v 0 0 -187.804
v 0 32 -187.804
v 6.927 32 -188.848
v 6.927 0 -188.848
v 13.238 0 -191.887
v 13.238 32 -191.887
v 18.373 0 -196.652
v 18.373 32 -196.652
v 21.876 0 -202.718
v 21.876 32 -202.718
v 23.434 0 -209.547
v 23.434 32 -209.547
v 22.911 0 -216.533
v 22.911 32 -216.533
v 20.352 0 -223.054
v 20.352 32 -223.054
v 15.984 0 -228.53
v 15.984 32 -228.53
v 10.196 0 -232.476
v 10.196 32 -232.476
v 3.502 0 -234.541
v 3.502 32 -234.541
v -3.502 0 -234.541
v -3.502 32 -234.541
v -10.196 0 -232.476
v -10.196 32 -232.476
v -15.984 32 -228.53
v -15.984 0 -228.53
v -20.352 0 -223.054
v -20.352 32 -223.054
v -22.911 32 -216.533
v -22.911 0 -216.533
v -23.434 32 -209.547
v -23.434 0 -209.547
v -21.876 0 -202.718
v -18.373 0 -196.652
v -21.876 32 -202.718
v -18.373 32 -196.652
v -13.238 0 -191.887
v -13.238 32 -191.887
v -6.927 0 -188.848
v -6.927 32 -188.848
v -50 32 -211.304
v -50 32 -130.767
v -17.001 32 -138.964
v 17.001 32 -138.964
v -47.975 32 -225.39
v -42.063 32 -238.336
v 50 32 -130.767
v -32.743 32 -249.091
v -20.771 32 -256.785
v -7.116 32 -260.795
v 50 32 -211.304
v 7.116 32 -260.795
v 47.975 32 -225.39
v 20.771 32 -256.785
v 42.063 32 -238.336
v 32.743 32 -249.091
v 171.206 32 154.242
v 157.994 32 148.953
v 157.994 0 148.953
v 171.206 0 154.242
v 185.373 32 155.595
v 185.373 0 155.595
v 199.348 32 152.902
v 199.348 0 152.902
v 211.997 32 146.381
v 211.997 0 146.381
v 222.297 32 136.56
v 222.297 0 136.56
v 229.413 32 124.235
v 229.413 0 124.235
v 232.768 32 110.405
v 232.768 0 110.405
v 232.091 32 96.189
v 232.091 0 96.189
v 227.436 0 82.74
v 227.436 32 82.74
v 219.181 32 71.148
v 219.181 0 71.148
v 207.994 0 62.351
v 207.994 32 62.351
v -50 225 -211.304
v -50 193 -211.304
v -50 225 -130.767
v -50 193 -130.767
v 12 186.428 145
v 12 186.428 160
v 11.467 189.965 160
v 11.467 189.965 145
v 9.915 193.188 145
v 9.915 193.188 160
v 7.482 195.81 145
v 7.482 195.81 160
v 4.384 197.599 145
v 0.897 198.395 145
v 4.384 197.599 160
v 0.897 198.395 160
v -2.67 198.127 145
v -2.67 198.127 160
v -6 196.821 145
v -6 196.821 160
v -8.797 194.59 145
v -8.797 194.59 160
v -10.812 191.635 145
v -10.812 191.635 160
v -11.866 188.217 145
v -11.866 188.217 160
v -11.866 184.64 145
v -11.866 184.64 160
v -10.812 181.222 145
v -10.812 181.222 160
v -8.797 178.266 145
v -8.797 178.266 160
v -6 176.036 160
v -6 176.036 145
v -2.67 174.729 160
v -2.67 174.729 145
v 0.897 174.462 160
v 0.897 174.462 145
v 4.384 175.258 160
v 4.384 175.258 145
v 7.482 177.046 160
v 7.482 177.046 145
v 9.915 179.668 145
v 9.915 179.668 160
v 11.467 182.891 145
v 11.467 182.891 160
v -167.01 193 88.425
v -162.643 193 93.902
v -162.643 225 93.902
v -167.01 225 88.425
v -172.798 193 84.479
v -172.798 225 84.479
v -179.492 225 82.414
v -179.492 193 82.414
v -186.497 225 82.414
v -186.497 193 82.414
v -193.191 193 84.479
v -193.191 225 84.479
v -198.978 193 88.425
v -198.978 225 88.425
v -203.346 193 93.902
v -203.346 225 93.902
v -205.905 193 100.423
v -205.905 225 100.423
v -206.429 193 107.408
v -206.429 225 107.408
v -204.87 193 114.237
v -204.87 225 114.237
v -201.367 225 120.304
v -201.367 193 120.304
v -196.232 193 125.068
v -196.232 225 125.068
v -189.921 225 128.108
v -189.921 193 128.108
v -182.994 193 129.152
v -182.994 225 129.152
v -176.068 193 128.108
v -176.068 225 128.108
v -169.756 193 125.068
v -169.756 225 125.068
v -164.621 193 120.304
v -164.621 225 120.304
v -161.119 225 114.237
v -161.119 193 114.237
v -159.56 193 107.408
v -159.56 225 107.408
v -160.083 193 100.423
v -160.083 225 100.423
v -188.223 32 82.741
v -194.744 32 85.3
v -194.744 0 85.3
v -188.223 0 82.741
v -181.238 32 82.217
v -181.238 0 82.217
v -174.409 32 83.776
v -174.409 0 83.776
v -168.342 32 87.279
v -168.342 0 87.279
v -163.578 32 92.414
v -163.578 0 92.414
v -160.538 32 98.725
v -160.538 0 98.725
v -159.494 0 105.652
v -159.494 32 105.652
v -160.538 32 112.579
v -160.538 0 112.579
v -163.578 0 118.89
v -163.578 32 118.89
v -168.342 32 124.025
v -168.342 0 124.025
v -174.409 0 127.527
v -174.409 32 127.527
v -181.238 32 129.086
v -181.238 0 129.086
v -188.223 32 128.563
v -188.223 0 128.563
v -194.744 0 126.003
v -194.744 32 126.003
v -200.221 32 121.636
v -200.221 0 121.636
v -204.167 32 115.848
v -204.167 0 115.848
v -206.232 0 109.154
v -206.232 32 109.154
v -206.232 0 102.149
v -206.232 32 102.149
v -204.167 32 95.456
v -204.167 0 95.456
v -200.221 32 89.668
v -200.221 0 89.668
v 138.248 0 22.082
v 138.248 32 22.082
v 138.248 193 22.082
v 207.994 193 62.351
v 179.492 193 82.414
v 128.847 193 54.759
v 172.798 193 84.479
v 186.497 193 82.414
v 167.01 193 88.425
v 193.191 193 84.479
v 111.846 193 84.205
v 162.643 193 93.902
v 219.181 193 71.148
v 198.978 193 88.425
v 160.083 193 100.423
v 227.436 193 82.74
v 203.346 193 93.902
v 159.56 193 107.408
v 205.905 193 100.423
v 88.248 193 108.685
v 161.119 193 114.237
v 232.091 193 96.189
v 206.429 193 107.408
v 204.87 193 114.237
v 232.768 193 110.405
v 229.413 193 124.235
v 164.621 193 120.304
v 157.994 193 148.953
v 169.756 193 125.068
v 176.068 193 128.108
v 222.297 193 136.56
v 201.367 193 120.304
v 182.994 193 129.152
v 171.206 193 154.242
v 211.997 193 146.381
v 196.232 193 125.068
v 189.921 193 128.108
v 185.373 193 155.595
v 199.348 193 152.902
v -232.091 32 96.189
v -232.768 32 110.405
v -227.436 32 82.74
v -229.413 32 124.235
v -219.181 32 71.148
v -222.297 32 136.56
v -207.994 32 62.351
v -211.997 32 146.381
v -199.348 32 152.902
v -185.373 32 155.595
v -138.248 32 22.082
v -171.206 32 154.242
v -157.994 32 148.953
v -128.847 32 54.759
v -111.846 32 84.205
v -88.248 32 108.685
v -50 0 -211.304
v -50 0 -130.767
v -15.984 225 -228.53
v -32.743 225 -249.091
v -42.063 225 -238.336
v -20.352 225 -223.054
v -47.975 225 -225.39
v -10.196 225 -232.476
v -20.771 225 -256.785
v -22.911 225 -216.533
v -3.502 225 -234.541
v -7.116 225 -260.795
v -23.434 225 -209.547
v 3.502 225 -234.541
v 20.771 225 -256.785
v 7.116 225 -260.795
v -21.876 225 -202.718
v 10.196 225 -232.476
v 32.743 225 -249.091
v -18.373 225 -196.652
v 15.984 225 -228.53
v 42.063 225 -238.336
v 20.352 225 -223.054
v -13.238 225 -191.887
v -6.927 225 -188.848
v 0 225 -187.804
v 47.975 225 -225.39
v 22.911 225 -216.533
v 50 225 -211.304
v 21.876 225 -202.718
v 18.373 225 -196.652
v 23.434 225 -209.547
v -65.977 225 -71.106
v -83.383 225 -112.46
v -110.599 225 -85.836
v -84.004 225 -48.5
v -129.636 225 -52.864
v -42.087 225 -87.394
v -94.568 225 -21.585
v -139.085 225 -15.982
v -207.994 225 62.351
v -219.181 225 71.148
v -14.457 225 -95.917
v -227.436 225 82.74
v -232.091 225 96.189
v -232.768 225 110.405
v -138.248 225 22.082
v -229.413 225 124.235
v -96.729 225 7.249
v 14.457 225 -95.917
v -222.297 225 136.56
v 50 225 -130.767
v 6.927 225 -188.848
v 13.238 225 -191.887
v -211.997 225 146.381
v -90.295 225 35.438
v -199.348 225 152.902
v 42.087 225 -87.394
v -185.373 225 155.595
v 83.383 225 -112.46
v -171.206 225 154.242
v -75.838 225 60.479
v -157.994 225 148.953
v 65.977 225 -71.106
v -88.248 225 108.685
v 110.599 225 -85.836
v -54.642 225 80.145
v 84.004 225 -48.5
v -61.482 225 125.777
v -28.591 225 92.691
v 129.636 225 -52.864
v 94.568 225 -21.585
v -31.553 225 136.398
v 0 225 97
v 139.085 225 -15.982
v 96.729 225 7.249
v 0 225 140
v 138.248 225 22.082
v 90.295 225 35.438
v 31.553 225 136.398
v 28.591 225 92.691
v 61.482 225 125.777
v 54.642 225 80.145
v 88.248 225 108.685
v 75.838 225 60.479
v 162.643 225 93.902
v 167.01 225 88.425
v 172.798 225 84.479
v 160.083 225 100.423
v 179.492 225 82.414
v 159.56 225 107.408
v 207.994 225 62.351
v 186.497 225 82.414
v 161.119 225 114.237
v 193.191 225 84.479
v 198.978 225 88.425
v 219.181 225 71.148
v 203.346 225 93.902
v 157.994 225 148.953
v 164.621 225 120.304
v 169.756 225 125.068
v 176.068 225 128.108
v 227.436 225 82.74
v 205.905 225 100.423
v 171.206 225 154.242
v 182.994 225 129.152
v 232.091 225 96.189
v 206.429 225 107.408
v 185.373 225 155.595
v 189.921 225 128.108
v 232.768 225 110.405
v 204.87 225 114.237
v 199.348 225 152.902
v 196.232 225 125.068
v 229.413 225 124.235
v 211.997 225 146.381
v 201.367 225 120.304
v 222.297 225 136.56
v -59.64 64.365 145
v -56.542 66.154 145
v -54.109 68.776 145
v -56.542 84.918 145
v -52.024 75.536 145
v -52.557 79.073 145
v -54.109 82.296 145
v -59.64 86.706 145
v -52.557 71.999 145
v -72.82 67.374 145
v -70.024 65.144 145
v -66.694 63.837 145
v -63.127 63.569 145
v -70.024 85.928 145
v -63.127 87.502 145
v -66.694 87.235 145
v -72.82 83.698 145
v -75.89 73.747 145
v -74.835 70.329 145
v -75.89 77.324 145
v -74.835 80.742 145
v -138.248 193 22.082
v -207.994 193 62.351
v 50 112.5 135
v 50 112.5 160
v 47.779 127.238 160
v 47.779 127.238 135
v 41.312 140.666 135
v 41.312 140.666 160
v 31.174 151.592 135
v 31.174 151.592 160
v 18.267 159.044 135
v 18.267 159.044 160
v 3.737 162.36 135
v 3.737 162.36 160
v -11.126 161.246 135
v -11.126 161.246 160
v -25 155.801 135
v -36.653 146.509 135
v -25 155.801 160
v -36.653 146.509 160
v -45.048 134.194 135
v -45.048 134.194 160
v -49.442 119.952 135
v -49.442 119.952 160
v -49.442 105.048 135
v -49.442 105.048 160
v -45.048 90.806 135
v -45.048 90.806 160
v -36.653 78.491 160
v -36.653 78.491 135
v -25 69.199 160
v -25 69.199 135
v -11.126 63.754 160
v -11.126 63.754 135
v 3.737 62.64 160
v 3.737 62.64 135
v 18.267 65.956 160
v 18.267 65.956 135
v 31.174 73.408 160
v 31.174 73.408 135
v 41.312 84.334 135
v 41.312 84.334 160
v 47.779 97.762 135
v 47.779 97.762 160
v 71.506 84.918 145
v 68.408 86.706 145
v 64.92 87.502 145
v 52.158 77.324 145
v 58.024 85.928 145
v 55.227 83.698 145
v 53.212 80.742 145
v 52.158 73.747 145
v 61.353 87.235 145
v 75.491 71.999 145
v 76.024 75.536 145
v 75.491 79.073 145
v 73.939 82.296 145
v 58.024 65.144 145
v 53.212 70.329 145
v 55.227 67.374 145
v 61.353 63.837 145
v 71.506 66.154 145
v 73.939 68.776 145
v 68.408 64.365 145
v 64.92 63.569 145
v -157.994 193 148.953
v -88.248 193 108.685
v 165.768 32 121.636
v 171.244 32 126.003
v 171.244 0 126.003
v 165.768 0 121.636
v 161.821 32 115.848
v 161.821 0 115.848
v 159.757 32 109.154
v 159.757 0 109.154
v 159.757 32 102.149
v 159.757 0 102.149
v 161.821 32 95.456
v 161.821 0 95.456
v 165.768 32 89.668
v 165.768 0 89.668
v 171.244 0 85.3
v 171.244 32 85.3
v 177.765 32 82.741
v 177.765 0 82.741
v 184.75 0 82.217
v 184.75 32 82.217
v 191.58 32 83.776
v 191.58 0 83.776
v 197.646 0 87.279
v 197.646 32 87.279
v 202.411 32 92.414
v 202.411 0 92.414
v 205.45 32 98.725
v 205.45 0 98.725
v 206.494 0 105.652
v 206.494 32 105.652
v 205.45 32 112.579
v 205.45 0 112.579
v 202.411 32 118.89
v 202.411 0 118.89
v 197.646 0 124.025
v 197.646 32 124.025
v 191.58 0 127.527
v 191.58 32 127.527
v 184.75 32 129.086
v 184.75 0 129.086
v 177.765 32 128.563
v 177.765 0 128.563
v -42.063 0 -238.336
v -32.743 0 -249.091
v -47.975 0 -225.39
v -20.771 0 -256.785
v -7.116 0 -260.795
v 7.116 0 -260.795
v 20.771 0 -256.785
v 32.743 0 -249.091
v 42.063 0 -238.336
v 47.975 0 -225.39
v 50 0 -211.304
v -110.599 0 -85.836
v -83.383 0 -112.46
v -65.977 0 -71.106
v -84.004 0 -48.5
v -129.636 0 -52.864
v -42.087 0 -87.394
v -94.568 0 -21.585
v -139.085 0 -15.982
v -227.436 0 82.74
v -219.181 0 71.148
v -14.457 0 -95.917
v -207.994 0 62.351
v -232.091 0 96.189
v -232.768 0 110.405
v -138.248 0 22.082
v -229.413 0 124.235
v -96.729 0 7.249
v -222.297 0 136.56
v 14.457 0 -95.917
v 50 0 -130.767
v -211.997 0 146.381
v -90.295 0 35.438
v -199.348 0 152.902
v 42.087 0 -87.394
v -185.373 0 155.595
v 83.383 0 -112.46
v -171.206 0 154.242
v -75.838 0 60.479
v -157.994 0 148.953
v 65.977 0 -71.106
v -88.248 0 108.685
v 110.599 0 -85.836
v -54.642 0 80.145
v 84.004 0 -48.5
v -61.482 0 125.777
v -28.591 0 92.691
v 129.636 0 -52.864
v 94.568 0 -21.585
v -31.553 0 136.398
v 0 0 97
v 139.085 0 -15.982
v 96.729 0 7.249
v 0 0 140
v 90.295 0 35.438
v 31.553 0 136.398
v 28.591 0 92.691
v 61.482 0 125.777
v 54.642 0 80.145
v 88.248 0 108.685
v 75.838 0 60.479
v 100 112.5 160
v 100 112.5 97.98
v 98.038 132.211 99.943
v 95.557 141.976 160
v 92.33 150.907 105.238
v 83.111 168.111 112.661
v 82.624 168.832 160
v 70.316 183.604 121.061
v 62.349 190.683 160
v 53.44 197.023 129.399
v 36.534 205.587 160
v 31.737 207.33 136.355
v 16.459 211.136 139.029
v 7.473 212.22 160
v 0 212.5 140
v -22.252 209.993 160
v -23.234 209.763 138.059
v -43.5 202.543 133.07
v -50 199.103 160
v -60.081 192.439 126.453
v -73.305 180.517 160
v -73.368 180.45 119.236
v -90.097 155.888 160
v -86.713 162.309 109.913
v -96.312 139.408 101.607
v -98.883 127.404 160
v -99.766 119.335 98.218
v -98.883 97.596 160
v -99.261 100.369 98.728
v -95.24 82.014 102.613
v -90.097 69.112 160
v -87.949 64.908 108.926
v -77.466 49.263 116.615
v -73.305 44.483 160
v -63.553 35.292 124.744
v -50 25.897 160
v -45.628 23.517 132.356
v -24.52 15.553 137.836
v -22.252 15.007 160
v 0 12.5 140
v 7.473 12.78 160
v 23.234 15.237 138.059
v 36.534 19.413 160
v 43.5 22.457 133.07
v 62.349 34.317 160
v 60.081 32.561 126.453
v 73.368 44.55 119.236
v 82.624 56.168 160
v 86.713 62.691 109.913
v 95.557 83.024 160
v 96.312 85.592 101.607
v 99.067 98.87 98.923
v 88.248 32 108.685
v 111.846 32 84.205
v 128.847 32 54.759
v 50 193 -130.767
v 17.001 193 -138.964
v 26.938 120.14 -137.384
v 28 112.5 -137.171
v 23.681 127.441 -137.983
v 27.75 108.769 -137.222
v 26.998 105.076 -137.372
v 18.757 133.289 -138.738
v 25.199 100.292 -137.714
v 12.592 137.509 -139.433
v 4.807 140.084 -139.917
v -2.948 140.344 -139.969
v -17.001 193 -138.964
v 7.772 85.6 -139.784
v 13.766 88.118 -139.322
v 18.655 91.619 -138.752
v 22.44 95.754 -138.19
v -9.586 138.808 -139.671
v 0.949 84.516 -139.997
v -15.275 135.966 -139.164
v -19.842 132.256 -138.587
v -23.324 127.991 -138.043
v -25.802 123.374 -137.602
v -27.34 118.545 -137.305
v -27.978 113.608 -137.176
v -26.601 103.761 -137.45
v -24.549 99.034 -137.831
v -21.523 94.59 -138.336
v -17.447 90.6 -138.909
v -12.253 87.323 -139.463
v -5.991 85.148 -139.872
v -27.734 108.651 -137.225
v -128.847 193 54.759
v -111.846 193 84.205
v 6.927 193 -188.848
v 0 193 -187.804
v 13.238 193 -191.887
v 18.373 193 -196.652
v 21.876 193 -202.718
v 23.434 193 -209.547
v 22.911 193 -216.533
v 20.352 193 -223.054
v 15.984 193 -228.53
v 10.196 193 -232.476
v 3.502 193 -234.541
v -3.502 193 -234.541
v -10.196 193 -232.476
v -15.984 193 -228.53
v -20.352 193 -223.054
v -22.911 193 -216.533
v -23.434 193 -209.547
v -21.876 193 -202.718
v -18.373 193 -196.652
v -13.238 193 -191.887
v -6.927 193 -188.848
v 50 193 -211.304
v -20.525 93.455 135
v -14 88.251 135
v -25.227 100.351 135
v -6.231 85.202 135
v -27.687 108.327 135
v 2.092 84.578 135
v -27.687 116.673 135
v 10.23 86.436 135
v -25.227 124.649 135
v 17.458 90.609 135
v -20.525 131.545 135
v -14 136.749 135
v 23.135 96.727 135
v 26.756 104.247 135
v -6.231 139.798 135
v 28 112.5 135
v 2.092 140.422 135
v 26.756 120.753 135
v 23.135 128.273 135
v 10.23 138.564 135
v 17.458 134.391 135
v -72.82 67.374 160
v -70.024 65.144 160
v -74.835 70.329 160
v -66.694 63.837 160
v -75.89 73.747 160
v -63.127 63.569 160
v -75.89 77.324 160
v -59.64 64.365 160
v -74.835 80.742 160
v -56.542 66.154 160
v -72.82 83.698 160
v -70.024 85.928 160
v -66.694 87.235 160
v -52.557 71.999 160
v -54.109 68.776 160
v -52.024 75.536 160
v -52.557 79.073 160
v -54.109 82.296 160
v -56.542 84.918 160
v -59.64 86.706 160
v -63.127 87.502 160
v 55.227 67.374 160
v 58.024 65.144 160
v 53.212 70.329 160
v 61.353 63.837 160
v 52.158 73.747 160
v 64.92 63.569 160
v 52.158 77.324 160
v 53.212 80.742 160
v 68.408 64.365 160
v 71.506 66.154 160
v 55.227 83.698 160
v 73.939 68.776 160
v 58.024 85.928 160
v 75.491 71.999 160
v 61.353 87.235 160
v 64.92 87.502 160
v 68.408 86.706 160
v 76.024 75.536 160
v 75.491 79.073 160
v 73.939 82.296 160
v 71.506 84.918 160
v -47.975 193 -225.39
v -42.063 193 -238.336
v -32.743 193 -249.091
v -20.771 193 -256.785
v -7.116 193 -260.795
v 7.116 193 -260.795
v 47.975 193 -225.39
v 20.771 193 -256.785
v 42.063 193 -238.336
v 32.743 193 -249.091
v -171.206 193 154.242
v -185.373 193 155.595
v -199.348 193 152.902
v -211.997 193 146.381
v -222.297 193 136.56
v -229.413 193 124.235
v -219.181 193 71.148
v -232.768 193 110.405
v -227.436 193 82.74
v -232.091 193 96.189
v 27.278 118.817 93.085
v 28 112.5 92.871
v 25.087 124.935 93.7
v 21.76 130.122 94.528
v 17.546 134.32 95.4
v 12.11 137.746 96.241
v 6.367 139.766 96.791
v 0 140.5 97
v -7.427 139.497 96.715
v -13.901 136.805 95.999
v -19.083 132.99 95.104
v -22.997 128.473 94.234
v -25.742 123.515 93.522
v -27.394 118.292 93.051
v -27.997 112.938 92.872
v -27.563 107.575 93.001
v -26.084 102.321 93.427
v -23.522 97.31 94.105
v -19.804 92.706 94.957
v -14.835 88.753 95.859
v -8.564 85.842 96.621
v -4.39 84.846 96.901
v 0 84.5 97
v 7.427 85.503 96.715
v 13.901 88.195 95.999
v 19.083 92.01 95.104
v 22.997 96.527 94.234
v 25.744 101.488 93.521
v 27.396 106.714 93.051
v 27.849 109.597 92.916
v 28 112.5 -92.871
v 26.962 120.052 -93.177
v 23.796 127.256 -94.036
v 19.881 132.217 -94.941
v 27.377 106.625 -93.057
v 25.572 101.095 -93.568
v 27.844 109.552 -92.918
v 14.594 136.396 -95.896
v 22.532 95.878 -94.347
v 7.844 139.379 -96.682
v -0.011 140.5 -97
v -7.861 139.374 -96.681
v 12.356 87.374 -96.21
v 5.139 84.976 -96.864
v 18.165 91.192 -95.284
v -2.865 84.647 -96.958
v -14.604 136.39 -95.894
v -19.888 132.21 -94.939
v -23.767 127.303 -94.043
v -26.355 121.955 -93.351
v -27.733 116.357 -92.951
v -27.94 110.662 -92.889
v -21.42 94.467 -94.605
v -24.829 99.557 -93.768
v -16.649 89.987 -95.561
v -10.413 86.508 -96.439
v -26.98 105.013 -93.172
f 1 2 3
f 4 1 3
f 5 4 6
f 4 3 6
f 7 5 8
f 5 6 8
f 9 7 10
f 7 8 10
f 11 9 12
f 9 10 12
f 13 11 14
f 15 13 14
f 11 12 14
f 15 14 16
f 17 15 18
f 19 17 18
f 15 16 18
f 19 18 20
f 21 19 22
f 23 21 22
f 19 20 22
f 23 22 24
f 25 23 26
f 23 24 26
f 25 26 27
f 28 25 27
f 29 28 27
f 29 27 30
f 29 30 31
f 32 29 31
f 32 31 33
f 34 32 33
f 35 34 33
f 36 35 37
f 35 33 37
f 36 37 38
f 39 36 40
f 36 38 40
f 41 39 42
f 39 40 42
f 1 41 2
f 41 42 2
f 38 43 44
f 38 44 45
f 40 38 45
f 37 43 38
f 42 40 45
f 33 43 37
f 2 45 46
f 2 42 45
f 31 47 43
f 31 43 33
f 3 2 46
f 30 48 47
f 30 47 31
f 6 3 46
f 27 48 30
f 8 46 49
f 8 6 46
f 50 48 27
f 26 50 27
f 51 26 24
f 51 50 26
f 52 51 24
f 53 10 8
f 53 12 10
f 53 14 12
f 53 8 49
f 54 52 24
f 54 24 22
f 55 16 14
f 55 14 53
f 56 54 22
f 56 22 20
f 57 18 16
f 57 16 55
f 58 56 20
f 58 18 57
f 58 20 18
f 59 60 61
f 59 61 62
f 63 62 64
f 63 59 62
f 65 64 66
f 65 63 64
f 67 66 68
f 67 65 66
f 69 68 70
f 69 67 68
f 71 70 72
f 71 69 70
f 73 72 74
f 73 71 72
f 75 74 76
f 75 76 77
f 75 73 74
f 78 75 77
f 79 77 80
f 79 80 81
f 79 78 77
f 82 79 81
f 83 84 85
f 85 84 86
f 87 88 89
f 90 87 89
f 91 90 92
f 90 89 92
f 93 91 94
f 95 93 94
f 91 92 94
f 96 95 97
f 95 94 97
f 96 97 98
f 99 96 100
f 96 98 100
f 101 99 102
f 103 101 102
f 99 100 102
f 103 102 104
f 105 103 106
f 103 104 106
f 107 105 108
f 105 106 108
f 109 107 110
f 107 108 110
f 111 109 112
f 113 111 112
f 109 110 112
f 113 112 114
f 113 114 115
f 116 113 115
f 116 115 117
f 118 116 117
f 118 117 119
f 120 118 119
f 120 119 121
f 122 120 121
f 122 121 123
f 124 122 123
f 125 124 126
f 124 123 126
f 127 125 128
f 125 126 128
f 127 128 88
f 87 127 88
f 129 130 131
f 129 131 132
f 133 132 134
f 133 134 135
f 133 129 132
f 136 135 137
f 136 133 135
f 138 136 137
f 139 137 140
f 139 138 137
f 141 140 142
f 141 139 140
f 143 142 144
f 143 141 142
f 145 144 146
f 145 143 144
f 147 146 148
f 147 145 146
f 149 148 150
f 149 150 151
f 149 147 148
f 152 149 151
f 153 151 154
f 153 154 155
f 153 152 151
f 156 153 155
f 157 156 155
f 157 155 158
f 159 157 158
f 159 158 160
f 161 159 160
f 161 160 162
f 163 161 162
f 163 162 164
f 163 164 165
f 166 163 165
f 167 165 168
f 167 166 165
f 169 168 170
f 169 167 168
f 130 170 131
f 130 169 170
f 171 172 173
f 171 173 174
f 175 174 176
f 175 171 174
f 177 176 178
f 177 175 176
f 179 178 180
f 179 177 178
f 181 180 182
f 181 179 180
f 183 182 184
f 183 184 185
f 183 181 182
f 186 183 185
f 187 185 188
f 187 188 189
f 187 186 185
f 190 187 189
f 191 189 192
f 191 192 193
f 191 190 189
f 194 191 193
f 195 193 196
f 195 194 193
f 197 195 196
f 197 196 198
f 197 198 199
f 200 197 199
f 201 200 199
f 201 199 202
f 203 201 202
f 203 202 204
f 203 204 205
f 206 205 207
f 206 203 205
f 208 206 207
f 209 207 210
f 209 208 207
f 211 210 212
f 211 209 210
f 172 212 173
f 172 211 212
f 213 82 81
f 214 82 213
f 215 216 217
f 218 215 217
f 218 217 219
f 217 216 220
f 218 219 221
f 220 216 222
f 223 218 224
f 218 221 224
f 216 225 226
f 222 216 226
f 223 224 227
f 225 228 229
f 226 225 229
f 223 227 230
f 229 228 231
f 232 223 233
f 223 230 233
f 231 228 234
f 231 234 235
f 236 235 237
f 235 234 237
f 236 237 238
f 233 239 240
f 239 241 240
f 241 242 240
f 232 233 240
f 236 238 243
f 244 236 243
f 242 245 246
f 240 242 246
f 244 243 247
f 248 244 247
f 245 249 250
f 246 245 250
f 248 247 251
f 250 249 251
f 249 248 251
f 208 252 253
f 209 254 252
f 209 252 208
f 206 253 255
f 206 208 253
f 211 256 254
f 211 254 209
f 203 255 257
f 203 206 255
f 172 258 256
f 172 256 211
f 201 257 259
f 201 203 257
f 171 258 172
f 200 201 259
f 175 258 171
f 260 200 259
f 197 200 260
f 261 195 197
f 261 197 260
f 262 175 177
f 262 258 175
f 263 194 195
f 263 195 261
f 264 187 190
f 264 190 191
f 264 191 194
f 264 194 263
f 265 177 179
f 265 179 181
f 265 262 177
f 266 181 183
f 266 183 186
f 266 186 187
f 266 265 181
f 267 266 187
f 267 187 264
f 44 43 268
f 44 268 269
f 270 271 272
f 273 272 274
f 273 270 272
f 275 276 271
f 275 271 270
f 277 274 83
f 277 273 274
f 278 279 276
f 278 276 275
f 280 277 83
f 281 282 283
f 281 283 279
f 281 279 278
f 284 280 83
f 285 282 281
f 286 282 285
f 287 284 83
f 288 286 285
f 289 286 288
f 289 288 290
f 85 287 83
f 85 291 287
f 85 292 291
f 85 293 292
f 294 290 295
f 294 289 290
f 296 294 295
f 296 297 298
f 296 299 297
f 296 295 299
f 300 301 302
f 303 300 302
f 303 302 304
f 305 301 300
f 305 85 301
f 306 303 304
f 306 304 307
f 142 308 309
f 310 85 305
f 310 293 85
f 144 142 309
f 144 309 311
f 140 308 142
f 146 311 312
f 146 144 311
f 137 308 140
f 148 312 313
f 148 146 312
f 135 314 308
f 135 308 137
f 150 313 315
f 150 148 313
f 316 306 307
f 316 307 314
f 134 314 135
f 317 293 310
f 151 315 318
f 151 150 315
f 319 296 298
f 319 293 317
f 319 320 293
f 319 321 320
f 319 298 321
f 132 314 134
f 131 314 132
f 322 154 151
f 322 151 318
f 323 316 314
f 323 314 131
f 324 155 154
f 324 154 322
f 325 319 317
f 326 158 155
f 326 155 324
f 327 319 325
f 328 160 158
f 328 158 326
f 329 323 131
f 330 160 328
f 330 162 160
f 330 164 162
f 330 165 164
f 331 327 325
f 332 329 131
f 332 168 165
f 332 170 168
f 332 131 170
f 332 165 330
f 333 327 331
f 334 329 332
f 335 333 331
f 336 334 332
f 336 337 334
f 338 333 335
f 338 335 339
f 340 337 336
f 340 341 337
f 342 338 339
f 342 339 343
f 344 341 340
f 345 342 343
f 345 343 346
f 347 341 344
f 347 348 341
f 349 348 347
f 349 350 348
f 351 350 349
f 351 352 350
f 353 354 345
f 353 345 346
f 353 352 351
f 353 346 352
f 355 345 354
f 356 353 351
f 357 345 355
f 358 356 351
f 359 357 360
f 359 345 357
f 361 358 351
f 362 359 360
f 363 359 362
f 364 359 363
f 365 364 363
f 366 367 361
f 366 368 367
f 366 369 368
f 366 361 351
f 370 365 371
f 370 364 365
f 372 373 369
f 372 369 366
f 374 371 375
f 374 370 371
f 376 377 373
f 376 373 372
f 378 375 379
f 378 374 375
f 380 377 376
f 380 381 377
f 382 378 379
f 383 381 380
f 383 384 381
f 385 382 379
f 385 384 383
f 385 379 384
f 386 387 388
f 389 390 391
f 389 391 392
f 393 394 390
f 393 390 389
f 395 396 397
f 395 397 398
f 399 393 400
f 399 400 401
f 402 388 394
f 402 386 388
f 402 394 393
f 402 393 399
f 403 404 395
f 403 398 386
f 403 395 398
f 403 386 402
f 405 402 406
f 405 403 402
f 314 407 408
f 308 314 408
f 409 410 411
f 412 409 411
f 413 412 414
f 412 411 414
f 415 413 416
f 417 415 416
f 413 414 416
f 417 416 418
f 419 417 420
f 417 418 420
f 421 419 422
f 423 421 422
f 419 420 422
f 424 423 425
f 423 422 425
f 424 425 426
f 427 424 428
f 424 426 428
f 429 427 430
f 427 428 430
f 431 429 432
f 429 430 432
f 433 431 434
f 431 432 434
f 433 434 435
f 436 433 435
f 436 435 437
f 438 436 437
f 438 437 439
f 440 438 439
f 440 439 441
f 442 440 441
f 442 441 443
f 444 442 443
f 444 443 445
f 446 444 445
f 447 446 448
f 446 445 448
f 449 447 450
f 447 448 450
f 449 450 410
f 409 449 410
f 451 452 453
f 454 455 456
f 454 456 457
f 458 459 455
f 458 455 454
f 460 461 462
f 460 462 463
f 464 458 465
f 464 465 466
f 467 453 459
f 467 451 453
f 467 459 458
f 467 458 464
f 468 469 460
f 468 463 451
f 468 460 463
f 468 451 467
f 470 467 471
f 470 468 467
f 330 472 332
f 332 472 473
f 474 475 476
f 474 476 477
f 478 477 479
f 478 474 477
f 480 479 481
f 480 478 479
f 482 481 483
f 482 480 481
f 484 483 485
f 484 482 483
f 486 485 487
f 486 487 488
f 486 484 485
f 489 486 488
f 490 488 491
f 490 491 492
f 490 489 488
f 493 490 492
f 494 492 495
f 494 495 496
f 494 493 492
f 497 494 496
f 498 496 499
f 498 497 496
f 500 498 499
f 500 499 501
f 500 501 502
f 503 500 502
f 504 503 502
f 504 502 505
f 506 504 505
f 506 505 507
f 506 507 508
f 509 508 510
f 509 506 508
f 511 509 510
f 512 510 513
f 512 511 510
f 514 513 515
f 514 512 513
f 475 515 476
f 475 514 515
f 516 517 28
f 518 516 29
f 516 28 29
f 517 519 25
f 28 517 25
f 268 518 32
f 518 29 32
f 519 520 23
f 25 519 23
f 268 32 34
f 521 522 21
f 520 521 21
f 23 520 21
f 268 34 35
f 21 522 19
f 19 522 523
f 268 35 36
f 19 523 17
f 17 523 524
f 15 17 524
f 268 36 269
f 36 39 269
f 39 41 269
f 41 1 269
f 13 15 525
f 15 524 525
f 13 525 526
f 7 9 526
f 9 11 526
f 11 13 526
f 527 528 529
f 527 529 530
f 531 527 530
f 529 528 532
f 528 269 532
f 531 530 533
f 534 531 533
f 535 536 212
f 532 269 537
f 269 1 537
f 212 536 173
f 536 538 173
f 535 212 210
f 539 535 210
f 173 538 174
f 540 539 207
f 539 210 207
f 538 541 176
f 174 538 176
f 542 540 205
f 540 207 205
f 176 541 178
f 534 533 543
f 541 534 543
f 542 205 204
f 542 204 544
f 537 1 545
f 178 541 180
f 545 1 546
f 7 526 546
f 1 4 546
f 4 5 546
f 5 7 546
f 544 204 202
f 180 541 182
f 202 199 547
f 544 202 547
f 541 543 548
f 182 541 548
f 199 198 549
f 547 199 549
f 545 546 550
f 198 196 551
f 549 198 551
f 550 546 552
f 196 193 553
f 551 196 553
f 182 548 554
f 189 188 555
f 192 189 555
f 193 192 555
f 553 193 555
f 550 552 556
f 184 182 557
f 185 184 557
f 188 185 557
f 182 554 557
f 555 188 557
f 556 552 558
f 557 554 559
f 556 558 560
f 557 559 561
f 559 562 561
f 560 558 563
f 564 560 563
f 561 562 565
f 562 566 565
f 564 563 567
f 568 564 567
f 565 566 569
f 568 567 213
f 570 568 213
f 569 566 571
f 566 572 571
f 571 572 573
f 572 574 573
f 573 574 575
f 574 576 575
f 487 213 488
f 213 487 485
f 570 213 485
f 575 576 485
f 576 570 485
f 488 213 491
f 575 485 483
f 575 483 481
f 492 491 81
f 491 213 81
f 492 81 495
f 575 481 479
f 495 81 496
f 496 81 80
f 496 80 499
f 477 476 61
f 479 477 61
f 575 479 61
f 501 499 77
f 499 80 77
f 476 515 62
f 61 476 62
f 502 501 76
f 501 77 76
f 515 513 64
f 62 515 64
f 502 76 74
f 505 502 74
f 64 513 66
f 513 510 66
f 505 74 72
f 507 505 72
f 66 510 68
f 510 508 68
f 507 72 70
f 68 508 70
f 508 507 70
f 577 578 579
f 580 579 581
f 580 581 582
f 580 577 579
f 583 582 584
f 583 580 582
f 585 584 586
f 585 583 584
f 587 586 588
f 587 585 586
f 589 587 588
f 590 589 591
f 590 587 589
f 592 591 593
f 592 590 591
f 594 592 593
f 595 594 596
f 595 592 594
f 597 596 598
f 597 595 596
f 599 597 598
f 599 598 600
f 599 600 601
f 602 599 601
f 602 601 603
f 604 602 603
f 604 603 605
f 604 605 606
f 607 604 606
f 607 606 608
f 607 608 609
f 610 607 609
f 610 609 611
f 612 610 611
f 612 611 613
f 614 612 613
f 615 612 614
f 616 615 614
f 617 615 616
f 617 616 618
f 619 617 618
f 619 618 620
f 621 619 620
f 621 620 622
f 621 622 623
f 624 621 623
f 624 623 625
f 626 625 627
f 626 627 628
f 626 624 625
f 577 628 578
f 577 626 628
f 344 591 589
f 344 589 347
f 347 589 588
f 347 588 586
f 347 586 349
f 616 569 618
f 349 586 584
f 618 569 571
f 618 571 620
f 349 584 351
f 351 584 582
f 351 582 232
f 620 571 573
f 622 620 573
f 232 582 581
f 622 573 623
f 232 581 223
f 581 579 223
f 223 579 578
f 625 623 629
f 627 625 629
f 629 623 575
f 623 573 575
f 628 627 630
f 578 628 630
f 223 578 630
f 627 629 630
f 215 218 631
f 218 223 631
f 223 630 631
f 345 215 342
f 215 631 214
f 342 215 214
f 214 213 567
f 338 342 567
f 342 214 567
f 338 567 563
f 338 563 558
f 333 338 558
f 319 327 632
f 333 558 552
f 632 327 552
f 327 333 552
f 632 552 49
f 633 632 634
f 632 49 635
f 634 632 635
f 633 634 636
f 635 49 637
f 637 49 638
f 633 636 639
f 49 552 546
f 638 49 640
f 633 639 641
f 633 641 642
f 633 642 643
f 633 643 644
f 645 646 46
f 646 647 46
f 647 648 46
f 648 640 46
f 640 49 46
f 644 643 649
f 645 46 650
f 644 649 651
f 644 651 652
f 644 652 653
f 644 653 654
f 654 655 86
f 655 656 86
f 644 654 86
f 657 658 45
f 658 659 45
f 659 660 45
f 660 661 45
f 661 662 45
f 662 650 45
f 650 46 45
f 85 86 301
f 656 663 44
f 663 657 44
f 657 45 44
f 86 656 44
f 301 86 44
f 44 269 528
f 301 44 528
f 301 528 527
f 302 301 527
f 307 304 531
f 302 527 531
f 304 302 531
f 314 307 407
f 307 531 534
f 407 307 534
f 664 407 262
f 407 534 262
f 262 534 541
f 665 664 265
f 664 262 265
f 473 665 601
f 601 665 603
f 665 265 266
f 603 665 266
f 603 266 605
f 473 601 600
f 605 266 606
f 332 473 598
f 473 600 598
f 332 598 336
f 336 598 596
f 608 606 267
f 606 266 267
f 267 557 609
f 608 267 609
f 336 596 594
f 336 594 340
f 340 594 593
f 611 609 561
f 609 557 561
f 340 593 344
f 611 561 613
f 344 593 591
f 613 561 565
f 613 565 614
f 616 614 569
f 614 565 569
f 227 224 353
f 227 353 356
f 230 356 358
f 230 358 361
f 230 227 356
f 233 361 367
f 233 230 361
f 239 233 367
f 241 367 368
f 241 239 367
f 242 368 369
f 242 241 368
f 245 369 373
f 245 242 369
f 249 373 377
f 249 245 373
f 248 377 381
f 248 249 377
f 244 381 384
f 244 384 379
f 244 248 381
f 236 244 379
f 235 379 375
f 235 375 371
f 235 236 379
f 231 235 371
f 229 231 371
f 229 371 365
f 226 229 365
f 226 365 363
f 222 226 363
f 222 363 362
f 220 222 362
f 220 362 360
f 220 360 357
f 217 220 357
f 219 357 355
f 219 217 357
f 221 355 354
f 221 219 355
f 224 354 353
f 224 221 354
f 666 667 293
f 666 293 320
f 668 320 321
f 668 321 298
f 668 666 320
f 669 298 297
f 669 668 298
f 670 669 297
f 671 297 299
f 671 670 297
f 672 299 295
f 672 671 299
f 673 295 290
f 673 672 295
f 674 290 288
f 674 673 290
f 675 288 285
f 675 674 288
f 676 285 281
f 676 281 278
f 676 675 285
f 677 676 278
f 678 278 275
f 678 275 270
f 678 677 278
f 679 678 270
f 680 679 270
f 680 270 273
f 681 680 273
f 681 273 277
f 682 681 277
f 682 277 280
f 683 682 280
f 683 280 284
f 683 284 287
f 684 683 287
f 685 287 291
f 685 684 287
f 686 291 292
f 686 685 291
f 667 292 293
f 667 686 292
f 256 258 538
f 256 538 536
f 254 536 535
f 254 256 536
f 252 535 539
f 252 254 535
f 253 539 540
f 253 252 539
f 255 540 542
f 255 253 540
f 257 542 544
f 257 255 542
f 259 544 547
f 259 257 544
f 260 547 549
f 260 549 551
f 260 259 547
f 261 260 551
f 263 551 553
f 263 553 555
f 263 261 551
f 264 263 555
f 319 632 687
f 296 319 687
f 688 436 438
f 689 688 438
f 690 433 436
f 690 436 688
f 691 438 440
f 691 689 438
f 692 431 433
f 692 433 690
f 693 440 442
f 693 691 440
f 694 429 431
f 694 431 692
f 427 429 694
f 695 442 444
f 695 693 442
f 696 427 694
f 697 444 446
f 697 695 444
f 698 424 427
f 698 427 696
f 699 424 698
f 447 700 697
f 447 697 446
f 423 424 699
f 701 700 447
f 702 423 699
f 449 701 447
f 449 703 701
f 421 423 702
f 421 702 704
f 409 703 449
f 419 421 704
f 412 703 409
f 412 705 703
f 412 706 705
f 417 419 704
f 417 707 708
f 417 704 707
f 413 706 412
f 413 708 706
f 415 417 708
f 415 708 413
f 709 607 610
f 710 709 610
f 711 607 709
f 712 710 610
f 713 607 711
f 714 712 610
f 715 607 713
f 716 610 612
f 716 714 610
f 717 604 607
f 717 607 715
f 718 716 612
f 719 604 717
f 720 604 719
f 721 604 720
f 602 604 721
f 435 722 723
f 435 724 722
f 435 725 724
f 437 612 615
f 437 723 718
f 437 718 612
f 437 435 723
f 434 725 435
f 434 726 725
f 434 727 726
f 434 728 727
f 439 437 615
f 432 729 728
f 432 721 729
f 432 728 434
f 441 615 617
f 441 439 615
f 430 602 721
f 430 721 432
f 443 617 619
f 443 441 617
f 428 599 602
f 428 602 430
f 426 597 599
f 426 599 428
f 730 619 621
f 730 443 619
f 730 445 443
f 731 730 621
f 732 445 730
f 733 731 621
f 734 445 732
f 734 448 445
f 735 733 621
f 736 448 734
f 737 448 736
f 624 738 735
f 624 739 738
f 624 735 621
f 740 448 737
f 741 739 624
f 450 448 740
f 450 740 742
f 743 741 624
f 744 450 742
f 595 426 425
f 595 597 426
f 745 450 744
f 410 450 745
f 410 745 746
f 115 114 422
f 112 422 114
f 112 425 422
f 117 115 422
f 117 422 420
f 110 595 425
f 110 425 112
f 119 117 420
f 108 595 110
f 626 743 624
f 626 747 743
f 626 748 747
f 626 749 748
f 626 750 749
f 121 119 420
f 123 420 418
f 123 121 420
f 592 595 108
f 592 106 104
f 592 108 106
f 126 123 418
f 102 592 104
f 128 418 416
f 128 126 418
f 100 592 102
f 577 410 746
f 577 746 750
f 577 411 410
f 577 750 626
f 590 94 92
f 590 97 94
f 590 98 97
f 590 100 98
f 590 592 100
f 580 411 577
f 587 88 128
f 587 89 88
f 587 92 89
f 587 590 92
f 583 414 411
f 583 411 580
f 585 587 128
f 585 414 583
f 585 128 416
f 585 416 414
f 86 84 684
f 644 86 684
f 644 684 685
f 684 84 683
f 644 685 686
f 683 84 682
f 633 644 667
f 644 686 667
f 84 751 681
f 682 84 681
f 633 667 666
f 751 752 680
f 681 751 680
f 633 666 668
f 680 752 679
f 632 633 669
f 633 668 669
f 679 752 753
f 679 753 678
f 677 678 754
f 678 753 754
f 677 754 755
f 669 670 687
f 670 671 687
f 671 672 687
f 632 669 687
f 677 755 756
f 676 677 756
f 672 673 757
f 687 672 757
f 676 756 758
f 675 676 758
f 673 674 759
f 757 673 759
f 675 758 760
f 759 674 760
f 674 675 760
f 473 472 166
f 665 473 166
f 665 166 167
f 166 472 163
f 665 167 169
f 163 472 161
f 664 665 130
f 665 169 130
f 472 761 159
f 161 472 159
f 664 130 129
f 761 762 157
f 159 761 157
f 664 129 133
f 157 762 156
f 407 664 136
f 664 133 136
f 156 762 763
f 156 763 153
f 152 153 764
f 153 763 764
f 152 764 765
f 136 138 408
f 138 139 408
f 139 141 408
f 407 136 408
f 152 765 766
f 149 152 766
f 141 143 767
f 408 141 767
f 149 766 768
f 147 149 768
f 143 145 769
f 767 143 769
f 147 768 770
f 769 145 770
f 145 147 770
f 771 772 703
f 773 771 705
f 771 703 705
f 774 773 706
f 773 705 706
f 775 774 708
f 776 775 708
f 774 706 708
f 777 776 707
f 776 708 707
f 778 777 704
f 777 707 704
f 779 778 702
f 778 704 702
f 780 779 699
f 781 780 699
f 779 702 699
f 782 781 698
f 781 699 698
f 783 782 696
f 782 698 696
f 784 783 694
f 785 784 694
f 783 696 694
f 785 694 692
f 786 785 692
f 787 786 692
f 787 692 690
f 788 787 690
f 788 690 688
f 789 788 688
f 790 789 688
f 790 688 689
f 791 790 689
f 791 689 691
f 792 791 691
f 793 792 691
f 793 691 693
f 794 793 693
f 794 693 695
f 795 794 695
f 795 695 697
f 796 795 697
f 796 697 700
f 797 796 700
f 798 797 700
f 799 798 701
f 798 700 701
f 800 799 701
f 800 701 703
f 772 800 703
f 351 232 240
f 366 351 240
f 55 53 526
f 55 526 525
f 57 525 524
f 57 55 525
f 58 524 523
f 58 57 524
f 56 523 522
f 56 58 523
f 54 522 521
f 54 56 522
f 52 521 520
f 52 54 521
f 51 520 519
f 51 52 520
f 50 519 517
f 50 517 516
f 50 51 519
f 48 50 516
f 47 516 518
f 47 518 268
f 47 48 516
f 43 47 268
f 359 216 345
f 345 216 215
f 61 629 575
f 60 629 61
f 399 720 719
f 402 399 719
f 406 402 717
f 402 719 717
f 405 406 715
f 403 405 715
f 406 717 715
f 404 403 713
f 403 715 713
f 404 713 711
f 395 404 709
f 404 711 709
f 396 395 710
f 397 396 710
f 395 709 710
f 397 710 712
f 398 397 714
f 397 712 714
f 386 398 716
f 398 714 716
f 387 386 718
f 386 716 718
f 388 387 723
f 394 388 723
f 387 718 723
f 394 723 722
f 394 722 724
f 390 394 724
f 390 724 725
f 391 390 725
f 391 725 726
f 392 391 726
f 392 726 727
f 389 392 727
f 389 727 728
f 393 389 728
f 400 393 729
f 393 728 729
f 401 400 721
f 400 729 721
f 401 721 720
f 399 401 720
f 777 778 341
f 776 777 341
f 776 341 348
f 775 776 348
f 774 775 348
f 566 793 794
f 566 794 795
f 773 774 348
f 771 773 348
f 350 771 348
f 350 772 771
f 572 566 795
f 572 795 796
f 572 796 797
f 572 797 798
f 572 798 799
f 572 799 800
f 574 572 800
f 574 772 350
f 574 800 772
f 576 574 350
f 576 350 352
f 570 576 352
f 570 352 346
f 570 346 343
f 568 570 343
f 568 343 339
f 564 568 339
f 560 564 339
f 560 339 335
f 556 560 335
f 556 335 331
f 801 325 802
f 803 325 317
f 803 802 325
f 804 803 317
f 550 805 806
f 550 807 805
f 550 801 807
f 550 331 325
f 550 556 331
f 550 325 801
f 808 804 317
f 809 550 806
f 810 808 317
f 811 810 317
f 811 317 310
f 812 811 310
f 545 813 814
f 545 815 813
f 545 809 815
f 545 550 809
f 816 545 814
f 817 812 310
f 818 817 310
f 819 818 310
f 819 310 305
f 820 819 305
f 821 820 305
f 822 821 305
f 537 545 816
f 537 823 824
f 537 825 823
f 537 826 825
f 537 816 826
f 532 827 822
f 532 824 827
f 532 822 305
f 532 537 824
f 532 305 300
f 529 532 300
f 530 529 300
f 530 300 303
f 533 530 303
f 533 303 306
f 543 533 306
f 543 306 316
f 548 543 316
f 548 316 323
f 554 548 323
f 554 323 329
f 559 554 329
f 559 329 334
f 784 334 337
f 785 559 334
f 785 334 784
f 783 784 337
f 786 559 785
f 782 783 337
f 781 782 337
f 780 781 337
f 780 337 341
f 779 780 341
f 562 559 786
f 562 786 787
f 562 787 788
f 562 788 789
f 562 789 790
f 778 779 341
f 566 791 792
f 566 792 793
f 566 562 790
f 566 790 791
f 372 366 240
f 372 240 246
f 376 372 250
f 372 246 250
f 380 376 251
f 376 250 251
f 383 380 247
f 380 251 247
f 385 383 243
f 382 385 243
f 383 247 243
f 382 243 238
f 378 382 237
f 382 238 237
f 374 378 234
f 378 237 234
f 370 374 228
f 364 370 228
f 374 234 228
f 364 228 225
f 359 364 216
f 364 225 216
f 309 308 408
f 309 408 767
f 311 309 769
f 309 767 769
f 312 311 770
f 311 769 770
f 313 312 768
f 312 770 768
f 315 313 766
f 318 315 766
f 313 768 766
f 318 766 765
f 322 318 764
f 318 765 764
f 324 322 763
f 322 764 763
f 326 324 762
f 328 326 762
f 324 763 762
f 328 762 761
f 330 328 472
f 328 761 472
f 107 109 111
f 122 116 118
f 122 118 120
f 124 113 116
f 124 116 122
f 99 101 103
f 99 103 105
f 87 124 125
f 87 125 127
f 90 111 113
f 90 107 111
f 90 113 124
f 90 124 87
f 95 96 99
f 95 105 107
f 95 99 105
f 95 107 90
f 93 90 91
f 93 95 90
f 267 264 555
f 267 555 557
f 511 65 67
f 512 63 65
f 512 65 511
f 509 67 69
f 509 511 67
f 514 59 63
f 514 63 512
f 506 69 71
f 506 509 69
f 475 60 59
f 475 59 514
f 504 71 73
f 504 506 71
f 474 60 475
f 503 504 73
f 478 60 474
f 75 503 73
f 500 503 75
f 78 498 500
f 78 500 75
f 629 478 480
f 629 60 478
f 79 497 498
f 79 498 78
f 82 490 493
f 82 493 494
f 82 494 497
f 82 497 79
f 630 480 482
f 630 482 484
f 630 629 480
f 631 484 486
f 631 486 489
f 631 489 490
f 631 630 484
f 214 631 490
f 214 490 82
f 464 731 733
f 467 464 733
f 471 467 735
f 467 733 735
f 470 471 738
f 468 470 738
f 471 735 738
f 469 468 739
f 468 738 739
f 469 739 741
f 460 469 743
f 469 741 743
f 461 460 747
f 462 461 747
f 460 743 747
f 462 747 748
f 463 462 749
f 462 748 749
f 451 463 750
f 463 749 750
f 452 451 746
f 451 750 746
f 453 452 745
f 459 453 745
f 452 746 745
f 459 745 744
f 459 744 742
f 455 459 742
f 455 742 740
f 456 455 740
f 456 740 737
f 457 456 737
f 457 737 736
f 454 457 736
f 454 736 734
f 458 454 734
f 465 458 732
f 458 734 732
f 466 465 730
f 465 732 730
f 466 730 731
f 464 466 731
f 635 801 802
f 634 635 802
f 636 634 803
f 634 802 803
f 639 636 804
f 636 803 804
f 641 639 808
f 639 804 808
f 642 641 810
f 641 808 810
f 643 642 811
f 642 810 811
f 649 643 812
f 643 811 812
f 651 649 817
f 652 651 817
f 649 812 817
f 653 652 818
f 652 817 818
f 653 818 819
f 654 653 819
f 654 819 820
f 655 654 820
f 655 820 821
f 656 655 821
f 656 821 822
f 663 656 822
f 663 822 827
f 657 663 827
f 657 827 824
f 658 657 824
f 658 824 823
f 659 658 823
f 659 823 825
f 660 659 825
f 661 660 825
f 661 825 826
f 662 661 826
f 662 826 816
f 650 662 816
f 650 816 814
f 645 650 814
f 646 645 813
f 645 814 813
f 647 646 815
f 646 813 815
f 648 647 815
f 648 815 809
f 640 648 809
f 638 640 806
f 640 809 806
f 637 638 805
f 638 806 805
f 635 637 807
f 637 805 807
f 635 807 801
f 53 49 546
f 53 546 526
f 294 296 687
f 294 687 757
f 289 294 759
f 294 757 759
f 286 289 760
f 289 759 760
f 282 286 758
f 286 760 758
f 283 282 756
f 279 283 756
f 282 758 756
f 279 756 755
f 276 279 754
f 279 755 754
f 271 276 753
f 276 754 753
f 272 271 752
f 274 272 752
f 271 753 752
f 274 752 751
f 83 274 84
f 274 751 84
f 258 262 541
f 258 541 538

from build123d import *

# Parameters (mm, degrees)
SKETCH1_R                = 140
SKETCH1_R_2              = 97
BOSS_EXTRUDE3_DEPTH      = 225
BOSS_EXTRUDE4_START      = -32
SKETCH4_R                = 23.5
BOSS_EXTRUDE4_DEPTH      = 32
CIRPATTERN2_COUNT        = 3
MIRROR1_START            = -32
MIRROR1_COPY_1_SKETCH_R  = 23.5
MIRROR1_COPY_1_DEPTH     = 32
MIRROR1_COPY_2_SKETCH_R  = 23.5
MIRROR1_COPY_2_DEPTH     = 32
BOSS_EXTRUDE5_REACH      = 533.421
BOSS_EXTRUDE5_END_RADIUS = 140
SKETCH6_R                = 100
SKETCH7_R                = 50
CUT_EXTRUDE1_DEPTH       = 25
SKETCH8_R                = 28
CUT_EXTRUDE2_DEPTH       = 512.827938218
SKETCH9_R                = 12
CUT_EXTRUDE3_DEPTH       = 15
CIRPATTERN3_COUNT        = 3


with BuildPart() as part:
    # Sketch1 → Boss-Extrude3 (new body)
    with BuildSketch(Plane(origin=(0, 0, 0), x_dir=(1, 0, 0), z_dir=(0, 1, 0))):
        with Locations(Location((0, 0, 0), (0, 0, 270))):
            Circle(SKETCH1_R)
        with Locations(Location((0, 0, 0), (0, 0, 270))):
            Circle(SKETCH1_R_2, mode=Mode.SUBTRACT)
    extrude(amount=BOSS_EXTRUDE3_DEPTH)

    # Sketch4 → Boss-Extrude4 (add)
    with BuildSketch(Plane(origin=(0, 225, 0), x_dir=(1, 0, 0), z_dir=(0, 1, 0)).offset(BOSS_EXTRUDE4_START)):
        with BuildLine():
            ThreePointArc((50, 211.303564756), (0, 261.303564756), (-50, 211.303564756))
            Line((-50, 211.303564756), (-50, 130.766968306))
            ThreePointArc((-50, 130.766968306), (0, 140), (50, 130.766968306))
            Line((50, 130.766968306), (50, 211.303564756))
        make_face()
        with Locations(Location((0, 211.303564756, 0), (0, 0, 270))):
            Circle(SKETCH4_R, mode=Mode.SUBTRACT)
    boss_extrude4 = extrude(amount=BOSS_EXTRUDE4_DEPTH)

    # CirPattern2: Boss-Extrude4 ×3 about axis
    cirpattern2_axis = Axis((0, 0, 0), (0, 1, 0))
    for i in range(1, CIRPATTERN2_COUNT):
        add(boss_extrude4.rotate(cirpattern2_axis, i * 360 / CIRPATTERN2_COUNT))

    # Mirror1: Boss-Extrude4 across plane
    add(boss_extrude4.mirror(Plane.ZX.offset(112.5)))

    # Mirror1 copy 1 sketch → Mirror1 copy 1 (add)
    with BuildSketch(Plane(origin=(0, 0, 0), x_dir=(-0.4999999999999998, 0, -0.8660254037844387), z_dir=(0, -1, 0)).offset(MIRROR1_START)):
        with BuildLine():
            ThreePointArc((50, -211.303564756), (0, -261.303564756), (-50, -211.303564756))
            Line((-50, -211.303564756), (-50, -130.766968306))
            ThreePointArc((-50, -130.766968306), (0, -140), (50, -130.766968306))
            Line((50, -130.766968306), (50, -211.303564756))
        make_face()
        with Locations((0, -211.303564756)):
            Circle(MIRROR1_COPY_1_SKETCH_R, mode=Mode.SUBTRACT)
    extrude(amount=MIRROR1_COPY_1_DEPTH)

    # Mirror1 copy 2 sketch → Mirror1 copy 2 (add)
    with BuildSketch(Plane(origin=(0, 0, 0), x_dir=(-0.5000000000000004, 0, 0.8660254037844384), z_dir=(0, -1, 0)).offset(MIRROR1_START)):
        with BuildLine():
            ThreePointArc((50, -211.303564756), (0, -261.303564756), (-50, -211.303564756))
            Line((-50, -211.303564756), (-50, -130.766968306))
            ThreePointArc((-50, -130.766968306), (0, -140), (50, -130.766968306))
            Line((50, -130.766968306), (50, -211.303564756))
        make_face()
        with Locations((0, -211.303564756)):
            Circle(MIRROR1_COPY_2_SKETCH_R, mode=Mode.SUBTRACT)
    extrude(amount=MIRROR1_COPY_2_DEPTH)

    # Boss-Extrude5: up to this cylinder (the profile starts outside it)
    boss_extrude5_end = Plane(origin=(0, 112.5, 0), z_dir=(0, -1, 0)) * Cylinder(BOSS_EXTRUDE5_END_RADIUS, 1347.842, mode=Mode.PRIVATE)
    # Sketch6 → Boss-Extrude5 (add, up to the surface)
    with BuildSketch(Plane.XY.offset(160), mode=Mode.PRIVATE) as boss_extrude5_sk1:
        with Locations((0, 112.5)):
            Circle(SKETCH6_R)
    boss_extrude5_tool1 = extrude(boss_extrude5_sk1.sketch, amount=-BOSS_EXTRUDE5_REACH, mode=Mode.PRIVATE) - boss_extrude5_end
    add(boss_extrude5_tool1.solids().sort_by_distance((0, 112.5, 160))[0])

    # Sketch7 → Cut-Extrude1 (cut)
    with BuildSketch(Plane.XY.offset(160)):
        with Locations((0, 112.5)):
            Circle(SKETCH7_R)
    extrude(amount=-CUT_EXTRUDE1_DEPTH, mode=Mode.SUBTRACT)

    # Sketch8 → Cut-Extrude2 (cut, through all)
    with BuildSketch(Plane.XY.offset(135)):
        with Locations((0, 112.5)):
            Circle(SKETCH8_R)
    extrude(amount=-CUT_EXTRUDE2_DEPTH, mode=Mode.SUBTRACT)

    # Sketch9 → Cut-Extrude3 (cut)
    with BuildSketch(Plane.XY.offset(160)):
        with Locations((0, 186.428214738)):
            Circle(SKETCH9_R)
    cut_extrude3 = extrude(amount=-CUT_EXTRUDE3_DEPTH, mode=Mode.SUBTRACT)

    # CirPattern3: Cut-Extrude3 ×3 about axis
    cirpattern3_axis = Axis((0, 112.5, 0), (0, 0, 1))
    for i in range(1, CIRPATTERN3_COUNT):
        add(cut_extrude3.rotate(cirpattern3_axis, i * 360 / CIRPATTERN3_COUNT), mode=Mode.SUBTRACT)


solid = part.part
